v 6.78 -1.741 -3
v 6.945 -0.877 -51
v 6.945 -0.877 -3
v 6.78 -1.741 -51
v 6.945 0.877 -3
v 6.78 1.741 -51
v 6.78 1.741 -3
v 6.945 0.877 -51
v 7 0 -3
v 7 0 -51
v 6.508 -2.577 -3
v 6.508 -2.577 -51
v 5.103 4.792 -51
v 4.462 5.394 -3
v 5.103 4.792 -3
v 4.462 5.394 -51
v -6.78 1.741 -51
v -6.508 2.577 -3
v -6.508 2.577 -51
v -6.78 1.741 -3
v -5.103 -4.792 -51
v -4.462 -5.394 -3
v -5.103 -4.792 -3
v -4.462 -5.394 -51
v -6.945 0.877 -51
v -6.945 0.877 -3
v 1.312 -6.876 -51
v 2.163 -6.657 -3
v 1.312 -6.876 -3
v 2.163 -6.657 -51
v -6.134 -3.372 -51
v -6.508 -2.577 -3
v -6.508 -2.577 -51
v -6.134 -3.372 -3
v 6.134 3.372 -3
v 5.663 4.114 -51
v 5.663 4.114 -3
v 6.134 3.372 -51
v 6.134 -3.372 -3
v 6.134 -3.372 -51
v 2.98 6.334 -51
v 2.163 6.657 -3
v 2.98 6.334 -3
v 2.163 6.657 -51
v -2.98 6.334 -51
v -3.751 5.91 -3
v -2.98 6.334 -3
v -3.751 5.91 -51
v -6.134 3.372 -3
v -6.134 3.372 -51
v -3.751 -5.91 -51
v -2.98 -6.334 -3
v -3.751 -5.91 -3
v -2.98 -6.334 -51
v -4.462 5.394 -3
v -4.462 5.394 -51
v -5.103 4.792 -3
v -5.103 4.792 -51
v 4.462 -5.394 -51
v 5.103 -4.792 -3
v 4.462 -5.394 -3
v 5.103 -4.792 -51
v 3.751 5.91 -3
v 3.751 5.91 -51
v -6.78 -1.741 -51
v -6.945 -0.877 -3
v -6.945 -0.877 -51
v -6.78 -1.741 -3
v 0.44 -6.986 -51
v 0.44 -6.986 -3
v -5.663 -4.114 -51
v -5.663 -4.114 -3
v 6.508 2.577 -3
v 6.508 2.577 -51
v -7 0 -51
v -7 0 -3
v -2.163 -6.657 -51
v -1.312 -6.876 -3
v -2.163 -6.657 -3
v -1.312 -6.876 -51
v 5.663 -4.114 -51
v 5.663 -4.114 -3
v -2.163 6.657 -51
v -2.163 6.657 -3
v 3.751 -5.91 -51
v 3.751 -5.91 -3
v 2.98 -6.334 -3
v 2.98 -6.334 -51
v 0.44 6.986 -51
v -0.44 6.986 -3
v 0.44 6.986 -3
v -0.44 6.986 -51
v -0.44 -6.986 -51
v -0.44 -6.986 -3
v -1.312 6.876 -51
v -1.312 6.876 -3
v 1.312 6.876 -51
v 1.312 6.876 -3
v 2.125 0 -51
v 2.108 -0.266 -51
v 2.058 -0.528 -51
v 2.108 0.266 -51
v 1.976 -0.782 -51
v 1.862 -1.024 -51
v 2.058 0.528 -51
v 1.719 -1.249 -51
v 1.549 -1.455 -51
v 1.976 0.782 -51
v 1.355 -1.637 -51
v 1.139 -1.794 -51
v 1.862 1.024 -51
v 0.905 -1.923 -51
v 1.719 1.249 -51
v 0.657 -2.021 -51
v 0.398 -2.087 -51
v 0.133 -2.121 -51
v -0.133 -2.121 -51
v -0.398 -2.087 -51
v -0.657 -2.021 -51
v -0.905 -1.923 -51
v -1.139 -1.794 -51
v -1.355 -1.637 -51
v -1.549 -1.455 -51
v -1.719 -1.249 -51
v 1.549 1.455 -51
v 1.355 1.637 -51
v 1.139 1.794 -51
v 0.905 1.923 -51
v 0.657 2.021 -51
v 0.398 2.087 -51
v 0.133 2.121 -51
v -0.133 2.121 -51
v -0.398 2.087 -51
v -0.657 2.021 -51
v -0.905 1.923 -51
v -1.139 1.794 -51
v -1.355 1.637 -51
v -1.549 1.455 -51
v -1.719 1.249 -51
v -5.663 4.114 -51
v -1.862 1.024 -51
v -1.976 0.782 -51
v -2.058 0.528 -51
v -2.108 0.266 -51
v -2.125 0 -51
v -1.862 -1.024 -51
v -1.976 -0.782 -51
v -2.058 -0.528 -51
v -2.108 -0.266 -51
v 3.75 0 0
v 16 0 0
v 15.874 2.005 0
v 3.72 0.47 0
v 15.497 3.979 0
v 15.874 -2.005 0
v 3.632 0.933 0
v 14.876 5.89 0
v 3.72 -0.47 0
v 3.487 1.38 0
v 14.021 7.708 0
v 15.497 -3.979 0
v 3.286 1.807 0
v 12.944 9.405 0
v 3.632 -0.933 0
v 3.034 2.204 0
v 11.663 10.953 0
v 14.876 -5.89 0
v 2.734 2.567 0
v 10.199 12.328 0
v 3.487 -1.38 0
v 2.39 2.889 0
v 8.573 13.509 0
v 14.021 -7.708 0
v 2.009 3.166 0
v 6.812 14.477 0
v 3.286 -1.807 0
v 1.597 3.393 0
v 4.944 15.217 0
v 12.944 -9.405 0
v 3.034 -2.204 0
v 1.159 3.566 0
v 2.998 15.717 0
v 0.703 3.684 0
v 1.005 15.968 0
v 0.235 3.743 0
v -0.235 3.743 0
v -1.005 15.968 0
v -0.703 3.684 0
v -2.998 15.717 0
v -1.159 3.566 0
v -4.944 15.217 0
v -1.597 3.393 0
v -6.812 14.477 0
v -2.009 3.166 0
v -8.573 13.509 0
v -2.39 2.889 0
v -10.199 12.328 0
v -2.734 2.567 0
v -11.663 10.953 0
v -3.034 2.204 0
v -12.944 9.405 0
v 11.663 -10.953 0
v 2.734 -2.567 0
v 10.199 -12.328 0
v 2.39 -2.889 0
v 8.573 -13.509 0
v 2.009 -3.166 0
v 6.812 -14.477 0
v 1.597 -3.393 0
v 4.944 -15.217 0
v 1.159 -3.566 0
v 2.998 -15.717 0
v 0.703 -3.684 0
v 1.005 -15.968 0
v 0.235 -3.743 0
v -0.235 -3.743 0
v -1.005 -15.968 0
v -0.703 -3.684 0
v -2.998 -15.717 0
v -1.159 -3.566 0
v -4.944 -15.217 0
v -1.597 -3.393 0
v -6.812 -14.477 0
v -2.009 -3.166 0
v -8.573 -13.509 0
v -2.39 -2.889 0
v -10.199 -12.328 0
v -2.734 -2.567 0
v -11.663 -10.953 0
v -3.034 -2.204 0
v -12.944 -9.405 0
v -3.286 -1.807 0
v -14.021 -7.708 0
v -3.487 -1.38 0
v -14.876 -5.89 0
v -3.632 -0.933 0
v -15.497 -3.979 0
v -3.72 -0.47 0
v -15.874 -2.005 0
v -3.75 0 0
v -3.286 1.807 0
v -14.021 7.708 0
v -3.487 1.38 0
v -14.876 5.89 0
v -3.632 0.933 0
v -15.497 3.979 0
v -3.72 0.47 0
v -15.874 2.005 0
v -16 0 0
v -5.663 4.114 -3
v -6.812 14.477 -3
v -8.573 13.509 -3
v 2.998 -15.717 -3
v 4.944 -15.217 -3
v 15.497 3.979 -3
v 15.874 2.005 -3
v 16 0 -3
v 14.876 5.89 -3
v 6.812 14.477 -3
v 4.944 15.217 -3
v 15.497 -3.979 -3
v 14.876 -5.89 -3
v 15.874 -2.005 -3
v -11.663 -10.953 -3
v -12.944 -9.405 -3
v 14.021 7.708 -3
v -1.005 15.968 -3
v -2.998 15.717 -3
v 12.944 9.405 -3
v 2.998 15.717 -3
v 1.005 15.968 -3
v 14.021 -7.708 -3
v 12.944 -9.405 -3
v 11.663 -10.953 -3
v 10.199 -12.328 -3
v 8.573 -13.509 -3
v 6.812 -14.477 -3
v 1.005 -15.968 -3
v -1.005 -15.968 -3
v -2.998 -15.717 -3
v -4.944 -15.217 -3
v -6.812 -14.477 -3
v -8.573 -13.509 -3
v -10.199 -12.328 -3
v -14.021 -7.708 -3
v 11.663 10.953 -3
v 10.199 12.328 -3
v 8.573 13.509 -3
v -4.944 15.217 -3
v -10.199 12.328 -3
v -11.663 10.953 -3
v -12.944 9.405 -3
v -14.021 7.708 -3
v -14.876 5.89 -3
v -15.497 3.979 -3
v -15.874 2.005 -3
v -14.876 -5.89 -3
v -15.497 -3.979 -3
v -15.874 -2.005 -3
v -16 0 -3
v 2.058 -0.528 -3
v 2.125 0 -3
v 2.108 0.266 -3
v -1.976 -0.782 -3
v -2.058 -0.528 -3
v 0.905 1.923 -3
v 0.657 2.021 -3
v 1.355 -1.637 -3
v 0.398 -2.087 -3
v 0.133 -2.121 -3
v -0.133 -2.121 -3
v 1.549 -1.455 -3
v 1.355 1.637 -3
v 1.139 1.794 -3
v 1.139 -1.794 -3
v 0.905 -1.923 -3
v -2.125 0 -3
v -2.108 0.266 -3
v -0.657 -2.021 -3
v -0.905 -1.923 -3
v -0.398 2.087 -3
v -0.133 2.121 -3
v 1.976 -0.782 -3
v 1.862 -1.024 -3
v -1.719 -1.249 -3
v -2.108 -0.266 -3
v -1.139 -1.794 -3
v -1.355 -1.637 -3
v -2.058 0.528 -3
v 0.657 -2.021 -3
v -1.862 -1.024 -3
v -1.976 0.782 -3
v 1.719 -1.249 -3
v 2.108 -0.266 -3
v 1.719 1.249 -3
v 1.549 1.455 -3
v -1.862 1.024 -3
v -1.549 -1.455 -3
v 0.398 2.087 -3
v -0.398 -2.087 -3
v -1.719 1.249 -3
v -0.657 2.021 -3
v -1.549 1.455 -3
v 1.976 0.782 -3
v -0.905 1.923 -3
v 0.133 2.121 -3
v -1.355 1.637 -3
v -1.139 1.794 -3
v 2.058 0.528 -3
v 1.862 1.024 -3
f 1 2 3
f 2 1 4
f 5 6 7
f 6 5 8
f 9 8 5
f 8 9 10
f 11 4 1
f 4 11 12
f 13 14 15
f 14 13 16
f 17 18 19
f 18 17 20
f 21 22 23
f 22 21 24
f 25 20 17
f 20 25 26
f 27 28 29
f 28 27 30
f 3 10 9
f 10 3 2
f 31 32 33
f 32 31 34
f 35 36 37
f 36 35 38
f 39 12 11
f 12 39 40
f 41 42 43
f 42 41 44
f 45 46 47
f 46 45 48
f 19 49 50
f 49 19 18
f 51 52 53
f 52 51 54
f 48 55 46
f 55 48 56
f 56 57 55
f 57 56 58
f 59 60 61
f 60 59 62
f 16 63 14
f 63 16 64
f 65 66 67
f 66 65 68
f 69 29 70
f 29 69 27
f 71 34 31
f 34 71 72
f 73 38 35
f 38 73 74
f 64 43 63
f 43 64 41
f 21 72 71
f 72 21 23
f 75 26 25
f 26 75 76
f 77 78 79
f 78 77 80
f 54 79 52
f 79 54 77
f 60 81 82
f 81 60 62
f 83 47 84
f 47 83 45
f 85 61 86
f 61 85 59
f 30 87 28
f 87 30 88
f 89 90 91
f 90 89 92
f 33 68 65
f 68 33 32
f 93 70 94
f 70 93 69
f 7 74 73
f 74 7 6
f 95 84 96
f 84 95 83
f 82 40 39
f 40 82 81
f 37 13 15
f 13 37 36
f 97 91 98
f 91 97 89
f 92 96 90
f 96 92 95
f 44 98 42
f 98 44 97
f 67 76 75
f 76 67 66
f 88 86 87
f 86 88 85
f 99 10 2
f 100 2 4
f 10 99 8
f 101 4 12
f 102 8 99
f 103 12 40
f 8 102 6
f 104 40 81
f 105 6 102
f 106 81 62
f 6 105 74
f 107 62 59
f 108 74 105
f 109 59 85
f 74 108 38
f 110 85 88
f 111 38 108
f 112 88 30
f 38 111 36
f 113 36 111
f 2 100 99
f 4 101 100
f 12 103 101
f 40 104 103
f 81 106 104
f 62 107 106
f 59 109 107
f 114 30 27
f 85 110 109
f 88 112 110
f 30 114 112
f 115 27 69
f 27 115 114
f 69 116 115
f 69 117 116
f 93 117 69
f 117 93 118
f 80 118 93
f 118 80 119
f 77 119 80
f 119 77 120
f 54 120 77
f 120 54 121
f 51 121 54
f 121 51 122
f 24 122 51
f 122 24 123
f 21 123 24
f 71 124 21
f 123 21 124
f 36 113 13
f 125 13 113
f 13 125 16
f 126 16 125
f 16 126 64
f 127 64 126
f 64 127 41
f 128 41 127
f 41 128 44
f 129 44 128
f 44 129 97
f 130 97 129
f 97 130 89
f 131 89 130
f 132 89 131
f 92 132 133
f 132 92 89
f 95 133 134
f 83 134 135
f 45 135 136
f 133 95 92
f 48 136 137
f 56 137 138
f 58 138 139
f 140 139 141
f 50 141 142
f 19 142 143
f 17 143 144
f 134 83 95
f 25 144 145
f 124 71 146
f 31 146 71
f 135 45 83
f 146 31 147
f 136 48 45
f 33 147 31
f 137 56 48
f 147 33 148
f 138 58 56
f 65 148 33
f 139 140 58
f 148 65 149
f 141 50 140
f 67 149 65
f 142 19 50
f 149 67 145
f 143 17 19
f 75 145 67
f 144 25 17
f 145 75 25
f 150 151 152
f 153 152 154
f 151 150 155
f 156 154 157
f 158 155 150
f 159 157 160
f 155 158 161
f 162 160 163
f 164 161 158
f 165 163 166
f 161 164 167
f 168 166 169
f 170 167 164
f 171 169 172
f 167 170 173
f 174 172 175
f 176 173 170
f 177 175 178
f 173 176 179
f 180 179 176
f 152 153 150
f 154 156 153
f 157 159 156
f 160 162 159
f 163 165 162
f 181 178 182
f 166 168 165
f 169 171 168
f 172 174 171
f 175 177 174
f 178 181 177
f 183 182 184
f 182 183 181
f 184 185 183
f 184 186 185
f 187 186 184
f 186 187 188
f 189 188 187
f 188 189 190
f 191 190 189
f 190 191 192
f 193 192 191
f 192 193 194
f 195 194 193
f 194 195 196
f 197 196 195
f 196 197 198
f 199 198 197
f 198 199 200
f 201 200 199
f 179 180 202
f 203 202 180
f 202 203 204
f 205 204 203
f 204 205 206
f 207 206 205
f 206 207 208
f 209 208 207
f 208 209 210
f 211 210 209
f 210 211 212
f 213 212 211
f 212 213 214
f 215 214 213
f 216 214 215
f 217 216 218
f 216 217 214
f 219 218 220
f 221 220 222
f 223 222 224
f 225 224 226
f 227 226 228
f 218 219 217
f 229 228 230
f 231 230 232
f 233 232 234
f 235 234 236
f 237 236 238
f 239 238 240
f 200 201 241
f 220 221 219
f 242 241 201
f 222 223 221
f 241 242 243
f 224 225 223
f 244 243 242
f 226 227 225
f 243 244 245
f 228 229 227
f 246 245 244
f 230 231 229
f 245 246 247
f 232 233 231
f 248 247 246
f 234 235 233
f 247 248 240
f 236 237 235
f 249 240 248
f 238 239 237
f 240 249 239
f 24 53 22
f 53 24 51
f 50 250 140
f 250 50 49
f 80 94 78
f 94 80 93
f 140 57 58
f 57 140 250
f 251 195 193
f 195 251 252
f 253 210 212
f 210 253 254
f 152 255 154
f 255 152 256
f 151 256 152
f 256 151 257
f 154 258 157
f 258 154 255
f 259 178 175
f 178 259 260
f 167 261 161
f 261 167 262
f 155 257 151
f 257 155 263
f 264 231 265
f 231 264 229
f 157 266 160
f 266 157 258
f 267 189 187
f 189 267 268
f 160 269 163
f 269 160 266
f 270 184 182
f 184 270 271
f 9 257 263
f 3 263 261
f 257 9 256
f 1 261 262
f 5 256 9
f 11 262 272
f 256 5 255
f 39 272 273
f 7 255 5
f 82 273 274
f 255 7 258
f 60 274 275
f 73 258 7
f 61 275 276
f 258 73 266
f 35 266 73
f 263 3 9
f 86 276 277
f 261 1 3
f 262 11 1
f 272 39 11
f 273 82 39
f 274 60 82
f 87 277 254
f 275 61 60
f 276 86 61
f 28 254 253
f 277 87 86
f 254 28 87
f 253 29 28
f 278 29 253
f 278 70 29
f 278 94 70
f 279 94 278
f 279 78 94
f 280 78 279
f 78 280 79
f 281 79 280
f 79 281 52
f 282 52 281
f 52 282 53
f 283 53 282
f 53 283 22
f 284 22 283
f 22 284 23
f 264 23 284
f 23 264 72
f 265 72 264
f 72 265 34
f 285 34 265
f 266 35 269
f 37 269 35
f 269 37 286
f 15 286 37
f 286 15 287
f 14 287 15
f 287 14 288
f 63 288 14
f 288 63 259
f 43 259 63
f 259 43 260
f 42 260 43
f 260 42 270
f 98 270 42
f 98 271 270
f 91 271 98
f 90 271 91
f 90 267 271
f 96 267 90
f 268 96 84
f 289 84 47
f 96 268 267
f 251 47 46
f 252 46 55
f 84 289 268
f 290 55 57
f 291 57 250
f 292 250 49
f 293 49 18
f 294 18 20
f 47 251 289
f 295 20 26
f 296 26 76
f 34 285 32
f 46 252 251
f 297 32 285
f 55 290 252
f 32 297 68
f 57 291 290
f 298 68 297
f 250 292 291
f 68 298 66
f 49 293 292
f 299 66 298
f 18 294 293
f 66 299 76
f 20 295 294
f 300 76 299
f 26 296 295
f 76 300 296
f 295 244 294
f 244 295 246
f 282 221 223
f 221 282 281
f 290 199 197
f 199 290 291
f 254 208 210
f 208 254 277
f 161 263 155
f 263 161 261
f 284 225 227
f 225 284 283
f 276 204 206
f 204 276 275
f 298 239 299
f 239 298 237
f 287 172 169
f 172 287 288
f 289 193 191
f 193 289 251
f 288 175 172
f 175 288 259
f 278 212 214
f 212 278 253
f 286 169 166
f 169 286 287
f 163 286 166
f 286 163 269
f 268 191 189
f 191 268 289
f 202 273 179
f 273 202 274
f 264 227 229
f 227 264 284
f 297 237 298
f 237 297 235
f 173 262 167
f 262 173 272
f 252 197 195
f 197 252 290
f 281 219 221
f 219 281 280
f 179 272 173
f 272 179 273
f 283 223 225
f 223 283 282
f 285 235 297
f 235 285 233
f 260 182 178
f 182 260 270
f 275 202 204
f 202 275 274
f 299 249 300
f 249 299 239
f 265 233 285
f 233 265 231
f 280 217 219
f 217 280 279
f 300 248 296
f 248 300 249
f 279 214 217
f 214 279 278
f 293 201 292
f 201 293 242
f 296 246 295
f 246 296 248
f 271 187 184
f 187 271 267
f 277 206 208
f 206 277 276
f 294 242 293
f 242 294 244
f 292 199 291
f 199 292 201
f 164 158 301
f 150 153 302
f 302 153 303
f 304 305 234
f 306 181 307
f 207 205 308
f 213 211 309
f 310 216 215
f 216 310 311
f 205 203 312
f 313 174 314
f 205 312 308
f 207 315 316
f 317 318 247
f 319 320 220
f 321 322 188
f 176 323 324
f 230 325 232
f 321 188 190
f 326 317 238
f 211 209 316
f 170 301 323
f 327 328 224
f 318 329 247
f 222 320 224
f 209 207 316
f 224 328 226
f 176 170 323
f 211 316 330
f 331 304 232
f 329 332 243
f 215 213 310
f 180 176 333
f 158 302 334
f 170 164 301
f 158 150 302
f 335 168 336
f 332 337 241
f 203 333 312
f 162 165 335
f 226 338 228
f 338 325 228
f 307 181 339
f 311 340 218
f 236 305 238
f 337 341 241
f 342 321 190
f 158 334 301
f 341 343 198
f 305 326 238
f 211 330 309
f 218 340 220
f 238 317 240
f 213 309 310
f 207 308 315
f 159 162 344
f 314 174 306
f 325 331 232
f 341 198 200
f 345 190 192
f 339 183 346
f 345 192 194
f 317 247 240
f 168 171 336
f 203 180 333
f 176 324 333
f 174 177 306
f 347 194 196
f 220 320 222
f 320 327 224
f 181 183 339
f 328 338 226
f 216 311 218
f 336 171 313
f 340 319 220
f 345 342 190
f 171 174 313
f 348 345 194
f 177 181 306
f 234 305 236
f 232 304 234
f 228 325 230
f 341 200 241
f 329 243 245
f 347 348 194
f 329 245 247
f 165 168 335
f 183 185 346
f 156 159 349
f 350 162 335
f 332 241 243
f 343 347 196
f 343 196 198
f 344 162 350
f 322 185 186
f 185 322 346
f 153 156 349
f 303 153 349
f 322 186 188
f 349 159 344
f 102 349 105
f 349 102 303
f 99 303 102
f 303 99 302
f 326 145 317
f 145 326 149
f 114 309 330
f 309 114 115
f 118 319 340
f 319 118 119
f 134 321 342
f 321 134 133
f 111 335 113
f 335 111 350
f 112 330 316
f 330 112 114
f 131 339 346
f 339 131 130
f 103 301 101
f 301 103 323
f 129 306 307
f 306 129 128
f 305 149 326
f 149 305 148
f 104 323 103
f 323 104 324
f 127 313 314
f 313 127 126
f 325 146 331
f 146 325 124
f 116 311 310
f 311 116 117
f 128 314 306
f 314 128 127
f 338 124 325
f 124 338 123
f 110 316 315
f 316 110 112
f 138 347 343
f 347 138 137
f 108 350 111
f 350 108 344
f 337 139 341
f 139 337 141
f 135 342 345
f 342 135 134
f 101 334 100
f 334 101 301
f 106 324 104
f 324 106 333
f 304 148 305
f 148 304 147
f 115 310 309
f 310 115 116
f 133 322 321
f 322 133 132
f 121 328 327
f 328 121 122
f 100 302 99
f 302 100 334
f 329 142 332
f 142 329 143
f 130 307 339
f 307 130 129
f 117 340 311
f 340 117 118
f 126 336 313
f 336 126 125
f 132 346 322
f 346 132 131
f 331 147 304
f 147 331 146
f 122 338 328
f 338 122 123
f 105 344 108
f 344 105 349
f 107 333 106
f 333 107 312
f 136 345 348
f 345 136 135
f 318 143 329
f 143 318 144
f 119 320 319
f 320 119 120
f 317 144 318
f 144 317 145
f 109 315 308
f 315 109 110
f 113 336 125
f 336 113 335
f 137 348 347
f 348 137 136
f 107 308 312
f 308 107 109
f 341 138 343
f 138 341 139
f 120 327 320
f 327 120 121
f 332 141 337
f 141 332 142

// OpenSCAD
$fn = 50;


difference() {
	union() {
		translate(v = [0, 0, -51.0000000000]) {
			cylinder(h = 51, r = 7.0000000000);
		}
		translate(v = [0, 0, -3.0000000000]) {
			cylinder(h = 3, r = 16.0000000000);
		}
	}
	union() {
		translate(v = [0, 0, 0]) {
			rotate(a = [0, 0, 0]) {
				difference() {
					union() {
						#translate(v = [0, 0, -51.0000000000]) {
							cylinder(h = 51, r = 2.0000000000);
						}
						#translate(v = [0, 0, -3]) {
							cylinder(h = 3, r1 = 2.1250000000, r2 = 3.7500000000);
						}
						#translate(v = [0, 0, -51.0000000000]) {
							cylinder(h = 51, r = 2.1250000000);
						}
						#translate(v = [0, 0, -51.0000000000]) {
							cylinder(h = 51, r = 2.0000000000);
						}
					}
					union();
				}
			}
		}
	}
}
